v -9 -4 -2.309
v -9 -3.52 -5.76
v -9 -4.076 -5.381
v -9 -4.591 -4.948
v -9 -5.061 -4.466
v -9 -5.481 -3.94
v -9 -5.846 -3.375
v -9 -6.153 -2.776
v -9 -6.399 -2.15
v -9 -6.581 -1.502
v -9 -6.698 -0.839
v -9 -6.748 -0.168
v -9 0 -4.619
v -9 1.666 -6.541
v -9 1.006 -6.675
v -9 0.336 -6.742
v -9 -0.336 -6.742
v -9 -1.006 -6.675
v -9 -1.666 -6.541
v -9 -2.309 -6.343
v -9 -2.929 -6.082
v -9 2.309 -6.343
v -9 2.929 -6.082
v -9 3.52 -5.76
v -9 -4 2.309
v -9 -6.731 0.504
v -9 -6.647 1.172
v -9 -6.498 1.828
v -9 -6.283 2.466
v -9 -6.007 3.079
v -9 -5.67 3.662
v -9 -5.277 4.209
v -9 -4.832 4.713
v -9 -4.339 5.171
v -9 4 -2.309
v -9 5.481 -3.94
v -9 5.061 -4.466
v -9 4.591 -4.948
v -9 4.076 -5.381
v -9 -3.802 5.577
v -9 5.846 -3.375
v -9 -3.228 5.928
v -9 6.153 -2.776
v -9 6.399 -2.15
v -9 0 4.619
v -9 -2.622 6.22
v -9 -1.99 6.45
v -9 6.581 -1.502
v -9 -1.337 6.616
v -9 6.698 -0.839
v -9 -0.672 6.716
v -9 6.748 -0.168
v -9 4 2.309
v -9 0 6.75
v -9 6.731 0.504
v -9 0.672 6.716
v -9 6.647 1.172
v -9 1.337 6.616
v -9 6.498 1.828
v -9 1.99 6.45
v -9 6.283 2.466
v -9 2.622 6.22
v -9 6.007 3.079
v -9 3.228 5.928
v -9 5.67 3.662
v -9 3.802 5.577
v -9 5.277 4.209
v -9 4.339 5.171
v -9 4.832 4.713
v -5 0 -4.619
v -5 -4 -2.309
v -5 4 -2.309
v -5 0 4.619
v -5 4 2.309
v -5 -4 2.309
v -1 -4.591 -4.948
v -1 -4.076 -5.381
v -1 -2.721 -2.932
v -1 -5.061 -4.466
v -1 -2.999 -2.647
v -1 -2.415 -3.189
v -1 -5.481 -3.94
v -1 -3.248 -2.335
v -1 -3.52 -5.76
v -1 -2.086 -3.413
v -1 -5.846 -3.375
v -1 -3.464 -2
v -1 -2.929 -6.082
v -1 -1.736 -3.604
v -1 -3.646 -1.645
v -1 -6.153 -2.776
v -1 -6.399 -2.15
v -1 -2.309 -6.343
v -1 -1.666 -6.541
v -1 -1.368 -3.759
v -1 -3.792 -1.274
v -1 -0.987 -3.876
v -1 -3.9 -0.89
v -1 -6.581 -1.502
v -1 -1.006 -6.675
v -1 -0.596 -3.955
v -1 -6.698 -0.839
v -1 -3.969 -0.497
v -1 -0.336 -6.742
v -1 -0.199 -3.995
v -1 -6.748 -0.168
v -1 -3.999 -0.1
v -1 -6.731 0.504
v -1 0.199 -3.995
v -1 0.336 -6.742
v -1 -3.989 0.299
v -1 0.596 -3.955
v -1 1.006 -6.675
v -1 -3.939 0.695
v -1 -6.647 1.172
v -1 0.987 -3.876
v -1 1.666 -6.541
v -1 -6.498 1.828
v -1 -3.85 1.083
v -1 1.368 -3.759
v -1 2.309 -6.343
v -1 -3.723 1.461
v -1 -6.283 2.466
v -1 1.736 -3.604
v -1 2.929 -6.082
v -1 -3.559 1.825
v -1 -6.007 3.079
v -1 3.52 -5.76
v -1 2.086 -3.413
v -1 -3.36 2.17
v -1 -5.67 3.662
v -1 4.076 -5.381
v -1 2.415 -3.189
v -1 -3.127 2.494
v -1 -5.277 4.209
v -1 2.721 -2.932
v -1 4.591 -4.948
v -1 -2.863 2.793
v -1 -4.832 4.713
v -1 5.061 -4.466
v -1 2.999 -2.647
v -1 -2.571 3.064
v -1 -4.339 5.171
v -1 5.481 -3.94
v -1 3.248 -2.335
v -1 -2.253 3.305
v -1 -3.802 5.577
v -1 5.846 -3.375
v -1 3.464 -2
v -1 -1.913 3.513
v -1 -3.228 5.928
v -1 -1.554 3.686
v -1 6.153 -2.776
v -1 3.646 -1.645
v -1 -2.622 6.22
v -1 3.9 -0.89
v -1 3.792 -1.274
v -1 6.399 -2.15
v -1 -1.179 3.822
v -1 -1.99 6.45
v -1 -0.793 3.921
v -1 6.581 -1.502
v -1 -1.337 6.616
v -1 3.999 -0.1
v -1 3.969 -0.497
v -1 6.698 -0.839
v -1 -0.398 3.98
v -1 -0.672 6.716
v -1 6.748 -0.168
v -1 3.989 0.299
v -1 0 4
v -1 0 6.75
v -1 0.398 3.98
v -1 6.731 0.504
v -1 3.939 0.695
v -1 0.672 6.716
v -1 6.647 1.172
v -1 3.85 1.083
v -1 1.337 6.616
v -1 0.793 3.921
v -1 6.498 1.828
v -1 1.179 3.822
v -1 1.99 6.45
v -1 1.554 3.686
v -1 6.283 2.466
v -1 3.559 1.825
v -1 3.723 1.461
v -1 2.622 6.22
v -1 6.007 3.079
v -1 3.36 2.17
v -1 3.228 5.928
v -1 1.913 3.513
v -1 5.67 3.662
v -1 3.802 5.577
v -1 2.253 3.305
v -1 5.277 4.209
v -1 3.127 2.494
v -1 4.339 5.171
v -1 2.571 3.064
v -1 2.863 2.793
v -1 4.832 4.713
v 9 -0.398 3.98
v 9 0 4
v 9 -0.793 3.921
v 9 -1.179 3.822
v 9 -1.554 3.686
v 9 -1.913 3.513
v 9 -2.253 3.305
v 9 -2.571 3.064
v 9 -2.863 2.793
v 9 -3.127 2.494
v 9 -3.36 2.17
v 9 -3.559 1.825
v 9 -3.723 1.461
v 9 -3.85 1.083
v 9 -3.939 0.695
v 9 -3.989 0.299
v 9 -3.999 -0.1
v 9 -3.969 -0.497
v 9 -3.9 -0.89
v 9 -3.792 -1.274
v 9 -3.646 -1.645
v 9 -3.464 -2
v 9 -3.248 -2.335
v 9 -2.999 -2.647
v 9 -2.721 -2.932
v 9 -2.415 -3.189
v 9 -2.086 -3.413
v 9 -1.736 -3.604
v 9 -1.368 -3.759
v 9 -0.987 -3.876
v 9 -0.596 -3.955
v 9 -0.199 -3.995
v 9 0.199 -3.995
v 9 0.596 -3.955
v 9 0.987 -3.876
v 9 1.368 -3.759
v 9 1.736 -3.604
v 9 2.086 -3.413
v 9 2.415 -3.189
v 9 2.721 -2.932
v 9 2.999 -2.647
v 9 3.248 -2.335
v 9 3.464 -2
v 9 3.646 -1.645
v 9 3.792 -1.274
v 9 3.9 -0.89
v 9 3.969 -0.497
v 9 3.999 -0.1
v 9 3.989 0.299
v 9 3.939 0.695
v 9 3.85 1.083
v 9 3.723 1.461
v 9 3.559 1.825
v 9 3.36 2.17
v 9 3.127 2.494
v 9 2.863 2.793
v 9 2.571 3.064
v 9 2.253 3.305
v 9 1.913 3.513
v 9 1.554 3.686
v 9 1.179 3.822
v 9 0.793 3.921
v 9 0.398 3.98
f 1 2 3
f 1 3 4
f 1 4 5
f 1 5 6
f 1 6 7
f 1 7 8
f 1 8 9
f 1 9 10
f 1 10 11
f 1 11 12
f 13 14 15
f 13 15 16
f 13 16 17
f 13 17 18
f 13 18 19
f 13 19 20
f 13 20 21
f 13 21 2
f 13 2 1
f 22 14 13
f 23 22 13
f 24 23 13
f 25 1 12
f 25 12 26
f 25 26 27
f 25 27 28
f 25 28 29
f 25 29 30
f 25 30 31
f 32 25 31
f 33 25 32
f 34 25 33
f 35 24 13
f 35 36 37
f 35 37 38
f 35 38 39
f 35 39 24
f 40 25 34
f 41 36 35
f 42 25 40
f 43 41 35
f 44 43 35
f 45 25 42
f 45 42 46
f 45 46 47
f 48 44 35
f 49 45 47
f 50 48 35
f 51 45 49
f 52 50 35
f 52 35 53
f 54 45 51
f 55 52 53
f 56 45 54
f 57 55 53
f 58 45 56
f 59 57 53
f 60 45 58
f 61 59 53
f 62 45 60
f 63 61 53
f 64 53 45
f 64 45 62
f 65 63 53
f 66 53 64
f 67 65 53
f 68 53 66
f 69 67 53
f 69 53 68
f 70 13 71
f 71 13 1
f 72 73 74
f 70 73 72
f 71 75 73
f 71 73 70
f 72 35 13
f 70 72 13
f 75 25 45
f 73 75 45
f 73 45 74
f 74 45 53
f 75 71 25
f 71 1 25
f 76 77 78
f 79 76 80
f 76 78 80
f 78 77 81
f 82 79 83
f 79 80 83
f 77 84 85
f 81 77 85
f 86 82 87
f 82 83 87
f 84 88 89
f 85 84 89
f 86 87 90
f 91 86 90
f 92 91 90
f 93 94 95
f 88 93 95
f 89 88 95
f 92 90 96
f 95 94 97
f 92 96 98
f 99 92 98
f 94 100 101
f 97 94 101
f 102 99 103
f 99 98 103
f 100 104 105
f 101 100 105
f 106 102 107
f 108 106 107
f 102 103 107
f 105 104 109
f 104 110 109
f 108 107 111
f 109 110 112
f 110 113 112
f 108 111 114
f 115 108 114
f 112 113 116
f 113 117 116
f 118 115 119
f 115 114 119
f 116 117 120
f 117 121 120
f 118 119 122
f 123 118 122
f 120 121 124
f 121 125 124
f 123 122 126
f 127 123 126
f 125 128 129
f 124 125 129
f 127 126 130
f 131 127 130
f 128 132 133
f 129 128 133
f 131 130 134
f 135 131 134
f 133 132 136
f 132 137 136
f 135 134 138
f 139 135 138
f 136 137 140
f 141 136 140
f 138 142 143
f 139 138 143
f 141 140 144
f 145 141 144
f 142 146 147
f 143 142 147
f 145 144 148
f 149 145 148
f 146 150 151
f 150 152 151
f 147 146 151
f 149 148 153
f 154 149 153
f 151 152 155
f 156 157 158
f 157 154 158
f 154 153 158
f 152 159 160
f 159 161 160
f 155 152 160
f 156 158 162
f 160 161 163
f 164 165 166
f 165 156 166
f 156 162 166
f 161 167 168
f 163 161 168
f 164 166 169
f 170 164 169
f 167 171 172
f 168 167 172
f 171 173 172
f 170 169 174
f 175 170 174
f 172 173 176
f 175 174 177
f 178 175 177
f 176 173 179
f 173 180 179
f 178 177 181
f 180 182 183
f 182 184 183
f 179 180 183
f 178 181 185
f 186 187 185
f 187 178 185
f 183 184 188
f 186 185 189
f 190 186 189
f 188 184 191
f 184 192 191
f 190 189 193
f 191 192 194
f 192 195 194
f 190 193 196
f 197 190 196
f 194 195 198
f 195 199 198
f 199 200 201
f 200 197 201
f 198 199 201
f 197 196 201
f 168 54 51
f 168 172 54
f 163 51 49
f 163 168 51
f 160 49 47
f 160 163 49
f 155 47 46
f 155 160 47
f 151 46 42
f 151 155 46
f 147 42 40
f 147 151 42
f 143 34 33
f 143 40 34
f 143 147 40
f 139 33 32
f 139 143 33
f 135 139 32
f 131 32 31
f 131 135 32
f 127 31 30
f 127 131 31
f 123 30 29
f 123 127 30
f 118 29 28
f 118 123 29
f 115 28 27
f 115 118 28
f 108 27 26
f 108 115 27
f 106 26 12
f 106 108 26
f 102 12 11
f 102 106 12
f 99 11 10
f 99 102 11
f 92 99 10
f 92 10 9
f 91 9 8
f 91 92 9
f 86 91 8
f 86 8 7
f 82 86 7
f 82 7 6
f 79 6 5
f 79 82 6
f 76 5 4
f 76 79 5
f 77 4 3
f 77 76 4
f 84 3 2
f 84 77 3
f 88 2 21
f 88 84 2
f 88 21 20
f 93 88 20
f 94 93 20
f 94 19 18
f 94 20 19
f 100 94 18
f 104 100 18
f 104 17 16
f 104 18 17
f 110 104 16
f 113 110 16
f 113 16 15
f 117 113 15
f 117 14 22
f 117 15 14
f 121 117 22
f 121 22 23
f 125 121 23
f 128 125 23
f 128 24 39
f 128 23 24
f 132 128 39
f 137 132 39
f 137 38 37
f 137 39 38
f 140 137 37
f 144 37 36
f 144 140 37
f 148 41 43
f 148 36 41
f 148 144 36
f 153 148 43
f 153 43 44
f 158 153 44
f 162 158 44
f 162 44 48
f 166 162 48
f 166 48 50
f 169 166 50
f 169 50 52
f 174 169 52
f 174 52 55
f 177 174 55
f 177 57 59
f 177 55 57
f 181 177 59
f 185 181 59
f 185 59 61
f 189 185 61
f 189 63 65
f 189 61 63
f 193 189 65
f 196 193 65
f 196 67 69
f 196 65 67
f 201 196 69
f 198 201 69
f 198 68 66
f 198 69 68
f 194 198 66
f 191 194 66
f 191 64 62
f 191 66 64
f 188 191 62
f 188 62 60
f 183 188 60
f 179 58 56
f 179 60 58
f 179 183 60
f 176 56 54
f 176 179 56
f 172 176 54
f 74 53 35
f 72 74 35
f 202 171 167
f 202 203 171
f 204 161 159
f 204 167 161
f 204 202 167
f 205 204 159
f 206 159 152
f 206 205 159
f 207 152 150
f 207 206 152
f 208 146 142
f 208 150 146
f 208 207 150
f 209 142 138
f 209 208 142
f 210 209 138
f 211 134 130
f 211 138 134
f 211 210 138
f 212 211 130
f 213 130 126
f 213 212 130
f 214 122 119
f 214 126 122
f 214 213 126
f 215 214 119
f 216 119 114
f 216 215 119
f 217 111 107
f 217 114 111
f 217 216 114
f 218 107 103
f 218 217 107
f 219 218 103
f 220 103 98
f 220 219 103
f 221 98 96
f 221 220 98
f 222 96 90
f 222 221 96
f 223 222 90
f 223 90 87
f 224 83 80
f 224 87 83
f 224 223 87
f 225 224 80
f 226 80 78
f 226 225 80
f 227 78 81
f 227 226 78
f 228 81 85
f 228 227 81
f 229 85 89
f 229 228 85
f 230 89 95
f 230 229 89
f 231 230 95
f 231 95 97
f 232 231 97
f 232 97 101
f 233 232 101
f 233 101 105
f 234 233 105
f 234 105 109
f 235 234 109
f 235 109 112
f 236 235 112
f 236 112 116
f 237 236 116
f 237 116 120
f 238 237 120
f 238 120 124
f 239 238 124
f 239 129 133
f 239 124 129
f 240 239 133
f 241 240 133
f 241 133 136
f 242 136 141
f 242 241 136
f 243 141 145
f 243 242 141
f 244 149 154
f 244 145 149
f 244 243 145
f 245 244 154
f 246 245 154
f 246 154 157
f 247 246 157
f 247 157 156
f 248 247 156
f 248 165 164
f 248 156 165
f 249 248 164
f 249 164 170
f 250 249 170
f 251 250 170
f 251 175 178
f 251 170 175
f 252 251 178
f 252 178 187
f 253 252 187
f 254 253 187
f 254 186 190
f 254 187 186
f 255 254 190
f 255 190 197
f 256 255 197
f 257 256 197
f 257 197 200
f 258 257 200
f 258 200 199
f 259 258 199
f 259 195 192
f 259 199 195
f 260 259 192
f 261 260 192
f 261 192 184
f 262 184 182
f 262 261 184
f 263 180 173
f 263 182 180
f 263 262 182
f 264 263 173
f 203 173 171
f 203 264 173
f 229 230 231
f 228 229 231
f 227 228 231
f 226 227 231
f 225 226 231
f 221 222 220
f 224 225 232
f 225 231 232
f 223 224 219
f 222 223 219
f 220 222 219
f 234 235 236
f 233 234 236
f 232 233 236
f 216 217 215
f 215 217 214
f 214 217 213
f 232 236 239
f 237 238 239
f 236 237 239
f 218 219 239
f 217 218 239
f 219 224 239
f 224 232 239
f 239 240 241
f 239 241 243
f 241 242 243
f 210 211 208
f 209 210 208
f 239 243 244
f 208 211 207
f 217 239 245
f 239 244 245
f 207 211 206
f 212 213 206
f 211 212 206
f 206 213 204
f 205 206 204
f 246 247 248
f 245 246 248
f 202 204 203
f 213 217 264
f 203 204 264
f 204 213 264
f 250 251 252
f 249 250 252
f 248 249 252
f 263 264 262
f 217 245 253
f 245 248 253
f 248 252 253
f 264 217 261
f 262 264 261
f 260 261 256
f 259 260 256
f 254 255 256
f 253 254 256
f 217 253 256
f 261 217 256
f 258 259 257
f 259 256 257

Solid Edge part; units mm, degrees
sketch "Sketch1" plane through (10.8674, 0, 10.8674) normal (0, -1, 0) x (1, 0, 0)
  line L0 (-19.8674, -10.8674) -> (-19.8674, -4.1174)
  line L1 (-19.8674, -4.1174) -> (-11.8674, -4.1174)
  line L2 (-11.8674, -4.1174) -> (-11.8674, -6.8674)
  line L3 (-11.8674, -6.8674) -> (-1.8674, -6.8674)
  line L4 (-1.8674, -6.8674) -> (-1.8674, -10.8674)
  dimension "D1" = 8
  dimension "D2" = 10
revolve "RevolvedProtrusion1" add sketch "Sketch1" angle 360 about axis through (16.5, 0, 0) along (-1, 0, 0)
sketch "Sketch2" plane through (-9, 0, 0) normal (-1, 0, 0) x (0, 0, -1)
  line L0 (4.6188, 0) -> (2.3094, 4)
  line L1 (2.3094, 4) -> (-2.3094, 4)
  line L2 (-2.3094, 4) -> (-4.6188, 0)
  line L3 (-4.6188, 0) -> (-2.3094, -4)
  line L4 (-2.3094, -4) -> (2.3094, -4)
  line L5 (2.3094, -4) -> (4.6188, 0)
  dimension "D1" = 8
extrude "Cutout1" cut sketch "Sketch2" against normal blind 4
cosmetic_thread "Gänga" size "M8" thread depth 5
properties material "Steel"
